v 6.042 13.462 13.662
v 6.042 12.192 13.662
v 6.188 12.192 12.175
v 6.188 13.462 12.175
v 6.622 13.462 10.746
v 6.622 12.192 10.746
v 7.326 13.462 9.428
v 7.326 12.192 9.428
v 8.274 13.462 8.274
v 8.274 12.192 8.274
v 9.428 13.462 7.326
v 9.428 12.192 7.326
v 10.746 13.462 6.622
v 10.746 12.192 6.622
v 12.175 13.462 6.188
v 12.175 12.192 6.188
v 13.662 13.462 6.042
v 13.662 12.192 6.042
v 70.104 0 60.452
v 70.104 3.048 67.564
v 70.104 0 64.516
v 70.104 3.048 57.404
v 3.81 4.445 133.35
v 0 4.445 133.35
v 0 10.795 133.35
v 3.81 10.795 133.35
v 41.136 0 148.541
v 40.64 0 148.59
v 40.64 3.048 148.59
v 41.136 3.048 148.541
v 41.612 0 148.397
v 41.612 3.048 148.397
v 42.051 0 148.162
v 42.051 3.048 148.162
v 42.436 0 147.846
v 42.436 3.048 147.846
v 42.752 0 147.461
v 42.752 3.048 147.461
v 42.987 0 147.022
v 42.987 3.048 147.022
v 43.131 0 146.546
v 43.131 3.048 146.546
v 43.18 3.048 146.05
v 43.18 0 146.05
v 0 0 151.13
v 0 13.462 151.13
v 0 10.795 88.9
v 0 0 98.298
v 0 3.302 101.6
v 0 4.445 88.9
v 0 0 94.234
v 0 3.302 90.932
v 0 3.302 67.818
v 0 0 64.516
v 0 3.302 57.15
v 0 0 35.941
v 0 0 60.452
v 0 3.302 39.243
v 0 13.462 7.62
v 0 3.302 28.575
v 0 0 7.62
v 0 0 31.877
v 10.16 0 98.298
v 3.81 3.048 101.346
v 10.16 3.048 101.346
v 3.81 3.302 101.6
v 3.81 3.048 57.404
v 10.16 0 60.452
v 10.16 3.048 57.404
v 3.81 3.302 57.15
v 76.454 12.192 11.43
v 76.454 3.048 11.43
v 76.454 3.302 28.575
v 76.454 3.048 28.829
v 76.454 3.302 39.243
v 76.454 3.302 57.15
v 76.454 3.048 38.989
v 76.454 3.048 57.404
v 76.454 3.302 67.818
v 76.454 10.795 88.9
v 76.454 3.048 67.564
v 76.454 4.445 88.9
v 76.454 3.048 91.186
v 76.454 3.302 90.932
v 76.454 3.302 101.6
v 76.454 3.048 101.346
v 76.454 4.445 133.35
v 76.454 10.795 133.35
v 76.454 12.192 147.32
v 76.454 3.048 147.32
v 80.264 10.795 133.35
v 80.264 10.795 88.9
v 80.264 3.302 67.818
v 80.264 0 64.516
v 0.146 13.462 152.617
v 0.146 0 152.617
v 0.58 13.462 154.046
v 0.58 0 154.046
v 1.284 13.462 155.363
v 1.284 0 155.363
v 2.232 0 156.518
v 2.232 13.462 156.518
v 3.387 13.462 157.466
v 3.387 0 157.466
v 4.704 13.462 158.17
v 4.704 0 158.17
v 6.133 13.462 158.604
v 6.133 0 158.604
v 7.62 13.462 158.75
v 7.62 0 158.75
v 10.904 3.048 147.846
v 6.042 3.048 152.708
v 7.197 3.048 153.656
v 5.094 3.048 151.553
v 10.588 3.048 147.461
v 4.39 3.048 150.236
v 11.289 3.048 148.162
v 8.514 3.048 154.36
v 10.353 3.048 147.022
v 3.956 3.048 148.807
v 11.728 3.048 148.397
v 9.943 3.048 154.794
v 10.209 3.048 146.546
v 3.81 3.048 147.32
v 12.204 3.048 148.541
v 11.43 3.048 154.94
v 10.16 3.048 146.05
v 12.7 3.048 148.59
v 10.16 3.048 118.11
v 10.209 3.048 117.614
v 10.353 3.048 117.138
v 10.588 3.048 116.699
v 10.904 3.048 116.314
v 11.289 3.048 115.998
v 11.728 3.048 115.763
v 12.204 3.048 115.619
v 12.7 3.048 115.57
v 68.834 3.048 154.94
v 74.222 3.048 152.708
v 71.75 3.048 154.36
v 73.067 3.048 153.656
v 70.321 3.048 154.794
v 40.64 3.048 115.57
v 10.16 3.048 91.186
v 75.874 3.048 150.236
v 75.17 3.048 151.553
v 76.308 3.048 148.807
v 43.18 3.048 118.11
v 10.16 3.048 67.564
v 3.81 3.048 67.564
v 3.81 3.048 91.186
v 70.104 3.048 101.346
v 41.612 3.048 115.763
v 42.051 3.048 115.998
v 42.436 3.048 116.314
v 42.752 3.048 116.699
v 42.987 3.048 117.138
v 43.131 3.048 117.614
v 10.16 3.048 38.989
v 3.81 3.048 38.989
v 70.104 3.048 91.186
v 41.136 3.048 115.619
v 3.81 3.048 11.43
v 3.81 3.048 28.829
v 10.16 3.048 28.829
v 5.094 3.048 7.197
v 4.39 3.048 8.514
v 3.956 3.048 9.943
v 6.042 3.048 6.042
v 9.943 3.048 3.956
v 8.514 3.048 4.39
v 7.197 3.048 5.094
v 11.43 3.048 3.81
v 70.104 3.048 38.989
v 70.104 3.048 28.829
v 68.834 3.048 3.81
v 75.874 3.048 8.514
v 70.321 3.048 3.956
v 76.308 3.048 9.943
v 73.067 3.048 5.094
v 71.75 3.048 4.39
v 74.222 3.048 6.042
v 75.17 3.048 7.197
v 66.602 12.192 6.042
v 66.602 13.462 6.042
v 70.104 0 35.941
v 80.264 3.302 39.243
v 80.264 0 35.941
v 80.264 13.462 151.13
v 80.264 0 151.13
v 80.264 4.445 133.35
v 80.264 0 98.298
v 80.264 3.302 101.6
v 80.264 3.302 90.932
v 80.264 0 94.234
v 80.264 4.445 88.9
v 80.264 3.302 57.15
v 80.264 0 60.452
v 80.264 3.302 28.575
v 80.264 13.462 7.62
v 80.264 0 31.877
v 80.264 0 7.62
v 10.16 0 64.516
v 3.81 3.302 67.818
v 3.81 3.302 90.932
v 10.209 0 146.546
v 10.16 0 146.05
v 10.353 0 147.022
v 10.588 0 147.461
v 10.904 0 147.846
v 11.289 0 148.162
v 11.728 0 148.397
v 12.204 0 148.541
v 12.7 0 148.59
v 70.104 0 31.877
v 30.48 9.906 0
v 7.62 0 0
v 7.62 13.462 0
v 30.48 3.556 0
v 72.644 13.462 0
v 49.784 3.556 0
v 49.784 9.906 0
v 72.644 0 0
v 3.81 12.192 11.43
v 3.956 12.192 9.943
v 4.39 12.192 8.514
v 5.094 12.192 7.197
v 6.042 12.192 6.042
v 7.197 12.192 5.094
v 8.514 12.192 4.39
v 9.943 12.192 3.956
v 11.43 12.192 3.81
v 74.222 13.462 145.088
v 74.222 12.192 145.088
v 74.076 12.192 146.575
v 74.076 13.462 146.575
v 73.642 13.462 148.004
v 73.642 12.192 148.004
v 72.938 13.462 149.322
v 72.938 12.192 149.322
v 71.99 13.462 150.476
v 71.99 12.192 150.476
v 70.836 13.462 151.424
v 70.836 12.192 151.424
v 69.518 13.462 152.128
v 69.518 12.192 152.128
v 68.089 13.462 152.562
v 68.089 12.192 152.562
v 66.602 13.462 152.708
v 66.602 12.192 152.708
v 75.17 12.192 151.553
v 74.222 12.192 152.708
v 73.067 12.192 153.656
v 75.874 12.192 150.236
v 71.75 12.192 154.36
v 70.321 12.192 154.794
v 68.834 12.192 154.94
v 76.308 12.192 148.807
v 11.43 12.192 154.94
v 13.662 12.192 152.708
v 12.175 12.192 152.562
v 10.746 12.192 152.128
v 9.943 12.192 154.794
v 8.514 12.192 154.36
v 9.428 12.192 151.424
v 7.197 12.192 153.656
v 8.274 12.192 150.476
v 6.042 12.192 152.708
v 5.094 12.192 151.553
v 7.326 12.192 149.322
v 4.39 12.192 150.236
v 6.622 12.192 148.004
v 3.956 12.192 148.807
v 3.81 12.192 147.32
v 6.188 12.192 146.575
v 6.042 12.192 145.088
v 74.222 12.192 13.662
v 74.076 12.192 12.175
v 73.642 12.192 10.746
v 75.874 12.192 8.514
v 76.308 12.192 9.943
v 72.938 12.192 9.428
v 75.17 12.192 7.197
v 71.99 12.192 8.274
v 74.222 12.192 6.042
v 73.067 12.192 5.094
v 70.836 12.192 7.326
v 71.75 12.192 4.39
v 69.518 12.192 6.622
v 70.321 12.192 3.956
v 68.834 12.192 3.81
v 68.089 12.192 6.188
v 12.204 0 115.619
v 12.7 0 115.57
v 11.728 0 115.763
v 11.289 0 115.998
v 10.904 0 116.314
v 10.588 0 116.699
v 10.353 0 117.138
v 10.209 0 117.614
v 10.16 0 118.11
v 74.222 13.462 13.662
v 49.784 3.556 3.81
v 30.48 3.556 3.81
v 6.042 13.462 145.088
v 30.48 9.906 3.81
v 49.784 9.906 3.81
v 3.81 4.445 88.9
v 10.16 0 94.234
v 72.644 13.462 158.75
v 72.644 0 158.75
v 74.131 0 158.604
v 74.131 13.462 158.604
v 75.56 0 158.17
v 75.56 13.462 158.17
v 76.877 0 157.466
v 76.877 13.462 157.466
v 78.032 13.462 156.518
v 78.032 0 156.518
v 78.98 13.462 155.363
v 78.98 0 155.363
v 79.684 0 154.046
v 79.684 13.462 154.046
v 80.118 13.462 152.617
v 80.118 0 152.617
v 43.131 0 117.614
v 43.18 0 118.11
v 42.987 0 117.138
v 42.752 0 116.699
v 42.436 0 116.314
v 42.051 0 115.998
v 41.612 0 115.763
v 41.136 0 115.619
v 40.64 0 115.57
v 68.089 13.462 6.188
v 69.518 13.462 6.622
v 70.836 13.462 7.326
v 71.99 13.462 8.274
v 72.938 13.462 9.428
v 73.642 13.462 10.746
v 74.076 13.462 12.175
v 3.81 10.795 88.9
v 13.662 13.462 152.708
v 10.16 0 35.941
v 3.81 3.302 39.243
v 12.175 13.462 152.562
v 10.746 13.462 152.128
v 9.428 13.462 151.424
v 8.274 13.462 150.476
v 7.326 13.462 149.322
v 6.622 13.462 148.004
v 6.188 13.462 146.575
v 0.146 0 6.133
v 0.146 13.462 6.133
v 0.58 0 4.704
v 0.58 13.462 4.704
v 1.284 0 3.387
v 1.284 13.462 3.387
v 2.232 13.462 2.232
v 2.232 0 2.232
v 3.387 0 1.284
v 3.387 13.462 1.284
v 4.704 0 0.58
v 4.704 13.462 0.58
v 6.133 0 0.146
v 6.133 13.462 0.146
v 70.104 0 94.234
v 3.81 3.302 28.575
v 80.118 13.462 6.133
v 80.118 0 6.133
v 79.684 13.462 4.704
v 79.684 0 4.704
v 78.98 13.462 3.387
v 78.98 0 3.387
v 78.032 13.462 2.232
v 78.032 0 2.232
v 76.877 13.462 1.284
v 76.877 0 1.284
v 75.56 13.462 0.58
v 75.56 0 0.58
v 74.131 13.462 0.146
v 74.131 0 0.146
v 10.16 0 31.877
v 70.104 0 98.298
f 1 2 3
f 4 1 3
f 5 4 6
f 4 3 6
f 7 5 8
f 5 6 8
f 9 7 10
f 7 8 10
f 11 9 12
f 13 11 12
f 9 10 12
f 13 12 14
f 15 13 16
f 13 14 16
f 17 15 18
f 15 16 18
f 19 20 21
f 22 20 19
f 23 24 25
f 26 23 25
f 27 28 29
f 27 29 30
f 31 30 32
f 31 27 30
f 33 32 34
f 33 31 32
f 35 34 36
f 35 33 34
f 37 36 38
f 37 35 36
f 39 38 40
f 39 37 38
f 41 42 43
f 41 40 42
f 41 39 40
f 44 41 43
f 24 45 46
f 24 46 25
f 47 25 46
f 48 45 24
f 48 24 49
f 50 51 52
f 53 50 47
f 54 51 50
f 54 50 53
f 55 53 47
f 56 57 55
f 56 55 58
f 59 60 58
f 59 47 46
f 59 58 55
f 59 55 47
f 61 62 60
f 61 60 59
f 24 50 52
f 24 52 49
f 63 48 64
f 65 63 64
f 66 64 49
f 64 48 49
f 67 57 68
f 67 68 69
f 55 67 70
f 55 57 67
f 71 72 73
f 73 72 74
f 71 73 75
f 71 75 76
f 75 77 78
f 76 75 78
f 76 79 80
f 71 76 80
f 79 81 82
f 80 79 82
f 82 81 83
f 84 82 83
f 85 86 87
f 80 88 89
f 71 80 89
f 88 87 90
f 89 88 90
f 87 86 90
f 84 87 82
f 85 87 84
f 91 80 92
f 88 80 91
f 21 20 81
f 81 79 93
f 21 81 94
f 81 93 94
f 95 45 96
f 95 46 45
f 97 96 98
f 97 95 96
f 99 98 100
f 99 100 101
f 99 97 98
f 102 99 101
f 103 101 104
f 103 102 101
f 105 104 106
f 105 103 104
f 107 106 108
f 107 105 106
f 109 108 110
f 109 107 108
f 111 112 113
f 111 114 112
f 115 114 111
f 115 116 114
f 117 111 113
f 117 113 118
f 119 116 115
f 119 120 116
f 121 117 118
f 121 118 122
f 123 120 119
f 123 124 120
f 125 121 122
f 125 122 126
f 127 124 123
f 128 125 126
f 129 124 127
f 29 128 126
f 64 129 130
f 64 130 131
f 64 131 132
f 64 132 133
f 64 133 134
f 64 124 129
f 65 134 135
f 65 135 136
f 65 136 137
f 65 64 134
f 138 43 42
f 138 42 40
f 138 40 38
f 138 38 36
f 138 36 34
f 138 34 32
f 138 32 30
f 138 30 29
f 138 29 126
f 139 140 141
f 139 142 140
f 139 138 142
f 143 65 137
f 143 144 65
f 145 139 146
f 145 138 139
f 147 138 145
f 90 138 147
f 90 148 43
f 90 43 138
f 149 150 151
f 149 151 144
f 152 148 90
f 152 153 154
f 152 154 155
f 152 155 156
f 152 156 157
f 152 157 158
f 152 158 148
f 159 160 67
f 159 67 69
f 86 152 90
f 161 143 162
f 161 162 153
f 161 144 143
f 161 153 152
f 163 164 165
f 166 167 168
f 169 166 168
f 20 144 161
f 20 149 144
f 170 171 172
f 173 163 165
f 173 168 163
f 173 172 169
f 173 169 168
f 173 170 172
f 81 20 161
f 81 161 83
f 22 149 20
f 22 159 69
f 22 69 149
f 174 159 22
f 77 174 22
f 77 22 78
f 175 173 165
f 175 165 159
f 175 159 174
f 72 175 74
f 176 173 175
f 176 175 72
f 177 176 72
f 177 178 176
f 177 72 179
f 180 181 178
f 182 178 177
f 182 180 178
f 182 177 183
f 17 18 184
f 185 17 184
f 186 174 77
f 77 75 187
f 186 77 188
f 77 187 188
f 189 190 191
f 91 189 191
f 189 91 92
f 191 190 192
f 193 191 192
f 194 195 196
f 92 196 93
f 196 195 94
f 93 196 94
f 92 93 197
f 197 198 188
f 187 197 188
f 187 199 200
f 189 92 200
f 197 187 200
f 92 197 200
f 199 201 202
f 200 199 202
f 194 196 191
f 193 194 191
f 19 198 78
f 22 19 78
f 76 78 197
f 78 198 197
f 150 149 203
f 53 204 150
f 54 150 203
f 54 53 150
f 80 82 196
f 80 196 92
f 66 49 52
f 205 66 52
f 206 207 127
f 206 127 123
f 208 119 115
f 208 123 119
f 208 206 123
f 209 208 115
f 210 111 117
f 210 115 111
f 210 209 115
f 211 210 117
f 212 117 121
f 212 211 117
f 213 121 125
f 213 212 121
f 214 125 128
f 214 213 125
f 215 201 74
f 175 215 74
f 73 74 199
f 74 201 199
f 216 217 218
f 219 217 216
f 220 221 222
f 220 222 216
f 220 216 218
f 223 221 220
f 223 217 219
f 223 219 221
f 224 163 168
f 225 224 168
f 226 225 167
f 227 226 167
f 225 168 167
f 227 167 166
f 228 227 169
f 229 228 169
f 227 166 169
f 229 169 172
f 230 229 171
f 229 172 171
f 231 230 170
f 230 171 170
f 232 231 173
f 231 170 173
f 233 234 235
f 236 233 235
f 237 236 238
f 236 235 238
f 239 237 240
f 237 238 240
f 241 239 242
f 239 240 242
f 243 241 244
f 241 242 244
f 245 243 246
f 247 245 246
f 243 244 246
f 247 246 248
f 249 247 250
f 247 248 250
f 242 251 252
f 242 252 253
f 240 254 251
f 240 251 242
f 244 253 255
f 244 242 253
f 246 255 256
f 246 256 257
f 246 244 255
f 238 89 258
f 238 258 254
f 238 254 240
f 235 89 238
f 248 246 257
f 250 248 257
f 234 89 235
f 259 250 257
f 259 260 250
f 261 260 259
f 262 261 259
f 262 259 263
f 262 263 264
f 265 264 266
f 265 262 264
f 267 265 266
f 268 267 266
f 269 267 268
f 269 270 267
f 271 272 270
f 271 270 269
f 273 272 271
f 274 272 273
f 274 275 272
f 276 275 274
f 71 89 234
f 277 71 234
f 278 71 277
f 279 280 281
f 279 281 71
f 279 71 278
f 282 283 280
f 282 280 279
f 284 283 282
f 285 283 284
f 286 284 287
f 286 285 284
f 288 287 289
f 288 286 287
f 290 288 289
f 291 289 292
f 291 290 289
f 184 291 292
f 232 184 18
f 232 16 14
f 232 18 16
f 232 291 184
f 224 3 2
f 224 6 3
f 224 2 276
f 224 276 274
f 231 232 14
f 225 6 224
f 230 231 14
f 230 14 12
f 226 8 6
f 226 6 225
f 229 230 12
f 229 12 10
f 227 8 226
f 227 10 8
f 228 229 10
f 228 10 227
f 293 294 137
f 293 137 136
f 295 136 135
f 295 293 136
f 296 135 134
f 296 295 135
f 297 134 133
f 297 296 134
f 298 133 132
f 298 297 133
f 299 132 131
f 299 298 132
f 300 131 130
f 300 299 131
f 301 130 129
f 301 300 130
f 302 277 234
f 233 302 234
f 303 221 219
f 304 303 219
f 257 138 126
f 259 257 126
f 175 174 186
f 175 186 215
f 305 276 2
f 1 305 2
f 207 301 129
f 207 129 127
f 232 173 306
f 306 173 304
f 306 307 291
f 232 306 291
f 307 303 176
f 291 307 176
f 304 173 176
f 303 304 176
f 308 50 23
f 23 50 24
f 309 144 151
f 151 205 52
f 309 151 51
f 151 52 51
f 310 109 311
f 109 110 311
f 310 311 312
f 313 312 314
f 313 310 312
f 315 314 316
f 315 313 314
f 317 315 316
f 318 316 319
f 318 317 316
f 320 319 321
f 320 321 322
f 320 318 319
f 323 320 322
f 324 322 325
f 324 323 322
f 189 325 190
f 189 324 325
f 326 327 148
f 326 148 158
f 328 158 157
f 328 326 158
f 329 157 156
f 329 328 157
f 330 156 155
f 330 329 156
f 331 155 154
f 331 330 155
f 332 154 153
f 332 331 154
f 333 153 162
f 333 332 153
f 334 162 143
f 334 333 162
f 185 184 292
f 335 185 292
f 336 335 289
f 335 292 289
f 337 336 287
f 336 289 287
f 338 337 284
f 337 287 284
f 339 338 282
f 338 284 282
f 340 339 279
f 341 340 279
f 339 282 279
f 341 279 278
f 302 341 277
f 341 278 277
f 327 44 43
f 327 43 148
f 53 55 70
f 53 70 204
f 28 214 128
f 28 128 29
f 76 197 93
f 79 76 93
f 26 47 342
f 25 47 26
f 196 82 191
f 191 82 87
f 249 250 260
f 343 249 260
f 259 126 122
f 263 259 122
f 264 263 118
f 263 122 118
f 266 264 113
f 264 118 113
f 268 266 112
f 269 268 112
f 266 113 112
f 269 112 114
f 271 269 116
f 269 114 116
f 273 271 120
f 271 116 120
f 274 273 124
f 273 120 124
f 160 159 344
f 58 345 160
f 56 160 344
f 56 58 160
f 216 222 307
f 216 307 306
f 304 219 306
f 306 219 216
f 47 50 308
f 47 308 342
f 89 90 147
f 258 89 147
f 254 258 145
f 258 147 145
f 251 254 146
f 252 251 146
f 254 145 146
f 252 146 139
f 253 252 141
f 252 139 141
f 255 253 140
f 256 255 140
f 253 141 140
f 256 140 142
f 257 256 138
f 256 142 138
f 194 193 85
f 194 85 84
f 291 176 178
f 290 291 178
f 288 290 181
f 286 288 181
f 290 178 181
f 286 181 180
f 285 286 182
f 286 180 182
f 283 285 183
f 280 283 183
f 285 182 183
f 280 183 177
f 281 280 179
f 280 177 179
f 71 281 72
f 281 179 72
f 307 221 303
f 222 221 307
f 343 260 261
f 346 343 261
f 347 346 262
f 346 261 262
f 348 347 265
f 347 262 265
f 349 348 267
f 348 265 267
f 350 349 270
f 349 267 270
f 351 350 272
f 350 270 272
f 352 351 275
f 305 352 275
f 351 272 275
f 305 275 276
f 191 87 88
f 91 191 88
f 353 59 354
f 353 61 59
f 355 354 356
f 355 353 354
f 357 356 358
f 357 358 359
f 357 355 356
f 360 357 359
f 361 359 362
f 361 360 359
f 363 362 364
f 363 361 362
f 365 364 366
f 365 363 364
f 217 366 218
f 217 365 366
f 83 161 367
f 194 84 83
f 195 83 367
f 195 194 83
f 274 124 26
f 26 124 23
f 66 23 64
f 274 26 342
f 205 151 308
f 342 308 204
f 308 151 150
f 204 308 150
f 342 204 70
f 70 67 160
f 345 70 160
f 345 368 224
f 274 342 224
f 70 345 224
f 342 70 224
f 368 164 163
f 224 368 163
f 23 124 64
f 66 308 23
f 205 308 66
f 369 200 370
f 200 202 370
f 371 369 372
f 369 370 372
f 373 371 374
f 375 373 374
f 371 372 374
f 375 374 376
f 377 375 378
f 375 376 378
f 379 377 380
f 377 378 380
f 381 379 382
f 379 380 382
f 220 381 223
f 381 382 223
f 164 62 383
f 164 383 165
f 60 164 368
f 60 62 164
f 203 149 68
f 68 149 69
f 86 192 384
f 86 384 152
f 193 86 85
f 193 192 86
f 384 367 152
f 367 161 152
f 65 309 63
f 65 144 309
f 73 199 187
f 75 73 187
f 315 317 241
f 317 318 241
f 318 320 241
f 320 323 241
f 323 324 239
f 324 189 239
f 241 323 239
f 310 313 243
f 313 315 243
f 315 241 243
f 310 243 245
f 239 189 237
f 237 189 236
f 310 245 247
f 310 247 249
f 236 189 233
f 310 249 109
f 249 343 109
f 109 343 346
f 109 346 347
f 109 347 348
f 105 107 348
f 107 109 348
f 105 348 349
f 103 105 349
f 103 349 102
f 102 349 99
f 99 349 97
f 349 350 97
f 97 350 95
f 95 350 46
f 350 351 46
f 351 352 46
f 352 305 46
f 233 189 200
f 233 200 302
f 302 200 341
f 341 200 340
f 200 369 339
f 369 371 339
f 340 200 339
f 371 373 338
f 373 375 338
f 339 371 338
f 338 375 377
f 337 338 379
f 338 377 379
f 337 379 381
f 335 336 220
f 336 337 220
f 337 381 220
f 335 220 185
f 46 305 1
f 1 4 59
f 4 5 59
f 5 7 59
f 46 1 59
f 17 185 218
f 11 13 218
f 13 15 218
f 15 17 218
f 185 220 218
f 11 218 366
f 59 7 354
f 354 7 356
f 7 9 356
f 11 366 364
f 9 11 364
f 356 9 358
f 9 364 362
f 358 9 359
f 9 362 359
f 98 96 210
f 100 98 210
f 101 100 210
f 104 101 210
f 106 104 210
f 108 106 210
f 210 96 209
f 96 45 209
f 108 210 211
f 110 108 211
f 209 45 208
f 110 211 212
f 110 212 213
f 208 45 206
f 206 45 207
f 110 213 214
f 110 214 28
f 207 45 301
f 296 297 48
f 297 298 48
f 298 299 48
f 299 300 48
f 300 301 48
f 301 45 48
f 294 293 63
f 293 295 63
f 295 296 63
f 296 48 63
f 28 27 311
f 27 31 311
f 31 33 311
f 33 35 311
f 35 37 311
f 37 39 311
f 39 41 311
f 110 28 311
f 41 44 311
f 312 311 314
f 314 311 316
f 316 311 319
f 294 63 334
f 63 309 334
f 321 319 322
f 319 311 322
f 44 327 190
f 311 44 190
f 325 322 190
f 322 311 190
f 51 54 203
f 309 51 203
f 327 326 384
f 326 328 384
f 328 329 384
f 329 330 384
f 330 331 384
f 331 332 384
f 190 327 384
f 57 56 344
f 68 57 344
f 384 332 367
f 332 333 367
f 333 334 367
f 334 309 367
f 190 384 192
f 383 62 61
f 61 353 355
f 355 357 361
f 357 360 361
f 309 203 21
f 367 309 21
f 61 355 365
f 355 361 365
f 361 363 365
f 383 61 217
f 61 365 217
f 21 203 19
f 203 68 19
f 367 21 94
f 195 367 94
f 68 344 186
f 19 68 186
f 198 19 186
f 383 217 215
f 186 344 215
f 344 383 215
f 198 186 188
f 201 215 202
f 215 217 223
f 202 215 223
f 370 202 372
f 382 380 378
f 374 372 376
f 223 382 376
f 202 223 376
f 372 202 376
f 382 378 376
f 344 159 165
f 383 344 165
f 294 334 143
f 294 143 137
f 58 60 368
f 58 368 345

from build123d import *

# Parameters (mm, degrees)
SKETCH1_W           = 80.264
SKETCH1_H           = 158.75
BOSS_EXTRUDE1_DEPTH = 3.048
SKETCH2_W           = 80.264
SKETCH2_H           = 158.75
BOSS_EXTRUDE2_DEPTH = 10.414
FILLET2_R           = 7.62
BOSS_EXTRUDE3_START = -1.27
BOSS_EXTRUDE3_DEPTH = 1.27
CUT_EXTRUDE1_DEPTH  = 179.39590141
CUT_EXTRUDE2_DEPTH  = 10.16
SKETCH6_W           = 19.304
SKETCH6_H           = 6.35
CUT_EXTRUDE4_DEPTH  = 3.81
SKETCH7_W           = 44.45
SKETCH7_H           = 6.35
CUT_EXTRUDE5_DEPTH  = 179.39590141


with BuildPart() as part:
    # Sketch1 → Boss-Extrude1 (new body)
    with BuildSketch(Plane(origin=(0, 0, 0), x_dir=(1, 0, 0), z_dir=(0, 1, 0))):
        with Locations((40.132, -79.375)):
            Rectangle(SKETCH1_W, SKETCH1_H)
    extrude(amount=BOSS_EXTRUDE1_DEPTH)

    # Sketch2 → Boss-Extrude2 (add)
    with BuildSketch(Plane(origin=(0, 3.048, 0), x_dir=(1, 0, 0), z_dir=(0, 1, 0))):
        with Locations((40.132, -79.375)):
            Rectangle(SKETCH2_W, SKETCH2_H)
        with BuildLine():
            Line((11.43, -3.81), (68.834, -3.81))
            ThreePointArc((68.834, -3.81), (74.222153673, -6.041846327), (76.454, -11.43))
            Line((76.454, -11.43), (76.454, -147.32))
            ThreePointArc((76.454, -147.32), (74.222153673, -152.708153673), (68.834, -154.94))
            Line((68.834, -154.94), (11.43, -154.94))
            ThreePointArc((11.43, -154.94), (6.041846327, -152.708153673), (3.81, -147.32))
            Line((3.81, -147.32), (3.81, -11.43))
            ThreePointArc((3.81, -11.43), (6.041846327, -6.041846327), (11.43, -3.81))
        make_face(mode=Mode.SUBTRACT)
    extrude(amount=BOSS_EXTRUDE2_DEPTH)

    # Fillet2
    fillet2_edges = [part.edges().sort_by_distance(p)[0] for p in [
        (0, 6.731, 0),
        (80.264, 6.731, 0),
        (80.264, 6.731, 158.75),
        (0, 6.731, 158.75),
    ]]
    fillet(fillet2_edges, radius=FILLET2_R)

    # Sketch3 → Boss-Extrude3 (add)
    with BuildSketch(Plane(origin=(0, 13.462, 0), x_dir=(1, 0, 0), z_dir=(0, 1, 0)).offset(BOSS_EXTRUDE3_START)):
        with BuildLine():
            Line((11.43, -3.81), (68.834, -3.81))
            ThreePointArc((68.834, -3.81), (74.222153673, -6.041846327), (76.454, -11.43))
            Line((76.454, -11.43), (76.454, -147.32))
            ThreePointArc((76.454, -147.32), (74.222153673, -152.708153673), (68.834, -154.94))
            Line((68.834, -154.94), (11.43, -154.94))
            ThreePointArc((11.43, -154.94), (6.041846327, -152.708153673), (3.81, -147.32))
            Line((3.81, -147.32), (3.81, -11.43))
            ThreePointArc((3.81, -11.43), (6.041846327, -6.041846327), (11.43, -3.81))
        make_face()
        with BuildLine():
            Line((13.661846327, -6.041846327), (66.602153673, -6.041846327))
            ThreePointArc((66.602153673, -6.041846327), (71.990307345, -8.273692655), (74.222153673, -13.661846327))
            Line((74.222153673, -13.661846327), (74.222153673, -145.088153673))
            ThreePointArc((74.222153673, -145.088153673), (71.990307345, -150.476307345), (66.602153673, -152.708153673))
            Line((66.602153673, -152.708153673), (13.661846327, -152.708153673))
            ThreePointArc((13.661846327, -152.708153673), (8.273692655, -150.476307345), (6.041846327, -145.088153673))
            Line((6.041846327, -145.088153673), (6.041846327, -13.661846327))
            ThreePointArc((6.041846327, -13.661846327), (8.273692655, -8.273692655), (13.661846327, -6.041846327))
        make_face(mode=Mode.SUBTRACT)
    extrude(amount=BOSS_EXTRUDE3_DEPTH)

    # Sketch4 → Cut-Extrude1 (cut, through all)
    with BuildSketch(Plane.XZ):
        with BuildLine():
            Line((12.7, 148.59), (40.64, 148.59))
            ThreePointArc((40.64, 148.59), (42.436051224, 147.846051224), (43.18, 146.05))
            Line((43.18, 146.05), (43.18, 118.11))
            ThreePointArc((43.18, 118.11), (42.436051224, 116.313948776), (40.64, 115.57))
            Line((40.64, 115.57), (12.7, 115.57))
            ThreePointArc((12.7, 115.57), (10.903948776, 116.313948776), (10.16, 118.11))
            Line((10.16, 118.11), (10.16, 146.05))
            ThreePointArc((10.16, 146.05), (10.903948776, 147.846051224), (12.7, 148.59))
        make_face()
    extrude(amount=-CUT_EXTRUDE1_DEPTH, mode=Mode.SUBTRACT)

    # Sketch5 → Cut-Extrude2 (cut)
    with BuildSketch(Plane(origin=(80.264, 0, 0), x_dir=(0, 0, -1), z_dir=(1, 0, 0))):
        Polygon((-98.298, 0), (-101.6, 3.302), (-90.932, 3.302), (-94.234, 0), align=None)
        Polygon((-60.452, 0), (-57.15, 3.302), (-67.818, 3.302), (-64.516, 0), align=None)
        Polygon((-39.243, 3.302), (-35.941, 0), (-31.877, 0), (-28.575, 3.302), align=None)
    cut_extrude2 = extrude(amount=-CUT_EXTRUDE2_DEPTH, mode=Mode.SUBTRACT)

    # Mirror1: Cut-Extrude2 across plane
    add(cut_extrude2.mirror(Plane(origin=(40.132, 0, 0), x_dir=(0, 0, 1), z_dir=(1, 0, 0))), mode=Mode.SUBTRACT)

    # Sketch6 → Cut-Extrude4 (cut)
    with BuildSketch(Plane(origin=(0, 0, 0), x_dir=(-1, 0, 0), z_dir=(0, 0, -1))):
        with Locations((-40.132, 6.731)):
            Rectangle(SKETCH6_W, SKETCH6_H)
    extrude(amount=-CUT_EXTRUDE4_DEPTH, mode=Mode.SUBTRACT)

    # Sketch7 → Cut-Extrude5 (cut, through all)
    with BuildSketch(Plane.ZY):
        with Locations((111.125, 7.62)):
            Rectangle(SKETCH7_W, SKETCH7_H)
    extrude(amount=-CUT_EXTRUDE5_DEPTH, mode=Mode.SUBTRACT)


solid = part.part
